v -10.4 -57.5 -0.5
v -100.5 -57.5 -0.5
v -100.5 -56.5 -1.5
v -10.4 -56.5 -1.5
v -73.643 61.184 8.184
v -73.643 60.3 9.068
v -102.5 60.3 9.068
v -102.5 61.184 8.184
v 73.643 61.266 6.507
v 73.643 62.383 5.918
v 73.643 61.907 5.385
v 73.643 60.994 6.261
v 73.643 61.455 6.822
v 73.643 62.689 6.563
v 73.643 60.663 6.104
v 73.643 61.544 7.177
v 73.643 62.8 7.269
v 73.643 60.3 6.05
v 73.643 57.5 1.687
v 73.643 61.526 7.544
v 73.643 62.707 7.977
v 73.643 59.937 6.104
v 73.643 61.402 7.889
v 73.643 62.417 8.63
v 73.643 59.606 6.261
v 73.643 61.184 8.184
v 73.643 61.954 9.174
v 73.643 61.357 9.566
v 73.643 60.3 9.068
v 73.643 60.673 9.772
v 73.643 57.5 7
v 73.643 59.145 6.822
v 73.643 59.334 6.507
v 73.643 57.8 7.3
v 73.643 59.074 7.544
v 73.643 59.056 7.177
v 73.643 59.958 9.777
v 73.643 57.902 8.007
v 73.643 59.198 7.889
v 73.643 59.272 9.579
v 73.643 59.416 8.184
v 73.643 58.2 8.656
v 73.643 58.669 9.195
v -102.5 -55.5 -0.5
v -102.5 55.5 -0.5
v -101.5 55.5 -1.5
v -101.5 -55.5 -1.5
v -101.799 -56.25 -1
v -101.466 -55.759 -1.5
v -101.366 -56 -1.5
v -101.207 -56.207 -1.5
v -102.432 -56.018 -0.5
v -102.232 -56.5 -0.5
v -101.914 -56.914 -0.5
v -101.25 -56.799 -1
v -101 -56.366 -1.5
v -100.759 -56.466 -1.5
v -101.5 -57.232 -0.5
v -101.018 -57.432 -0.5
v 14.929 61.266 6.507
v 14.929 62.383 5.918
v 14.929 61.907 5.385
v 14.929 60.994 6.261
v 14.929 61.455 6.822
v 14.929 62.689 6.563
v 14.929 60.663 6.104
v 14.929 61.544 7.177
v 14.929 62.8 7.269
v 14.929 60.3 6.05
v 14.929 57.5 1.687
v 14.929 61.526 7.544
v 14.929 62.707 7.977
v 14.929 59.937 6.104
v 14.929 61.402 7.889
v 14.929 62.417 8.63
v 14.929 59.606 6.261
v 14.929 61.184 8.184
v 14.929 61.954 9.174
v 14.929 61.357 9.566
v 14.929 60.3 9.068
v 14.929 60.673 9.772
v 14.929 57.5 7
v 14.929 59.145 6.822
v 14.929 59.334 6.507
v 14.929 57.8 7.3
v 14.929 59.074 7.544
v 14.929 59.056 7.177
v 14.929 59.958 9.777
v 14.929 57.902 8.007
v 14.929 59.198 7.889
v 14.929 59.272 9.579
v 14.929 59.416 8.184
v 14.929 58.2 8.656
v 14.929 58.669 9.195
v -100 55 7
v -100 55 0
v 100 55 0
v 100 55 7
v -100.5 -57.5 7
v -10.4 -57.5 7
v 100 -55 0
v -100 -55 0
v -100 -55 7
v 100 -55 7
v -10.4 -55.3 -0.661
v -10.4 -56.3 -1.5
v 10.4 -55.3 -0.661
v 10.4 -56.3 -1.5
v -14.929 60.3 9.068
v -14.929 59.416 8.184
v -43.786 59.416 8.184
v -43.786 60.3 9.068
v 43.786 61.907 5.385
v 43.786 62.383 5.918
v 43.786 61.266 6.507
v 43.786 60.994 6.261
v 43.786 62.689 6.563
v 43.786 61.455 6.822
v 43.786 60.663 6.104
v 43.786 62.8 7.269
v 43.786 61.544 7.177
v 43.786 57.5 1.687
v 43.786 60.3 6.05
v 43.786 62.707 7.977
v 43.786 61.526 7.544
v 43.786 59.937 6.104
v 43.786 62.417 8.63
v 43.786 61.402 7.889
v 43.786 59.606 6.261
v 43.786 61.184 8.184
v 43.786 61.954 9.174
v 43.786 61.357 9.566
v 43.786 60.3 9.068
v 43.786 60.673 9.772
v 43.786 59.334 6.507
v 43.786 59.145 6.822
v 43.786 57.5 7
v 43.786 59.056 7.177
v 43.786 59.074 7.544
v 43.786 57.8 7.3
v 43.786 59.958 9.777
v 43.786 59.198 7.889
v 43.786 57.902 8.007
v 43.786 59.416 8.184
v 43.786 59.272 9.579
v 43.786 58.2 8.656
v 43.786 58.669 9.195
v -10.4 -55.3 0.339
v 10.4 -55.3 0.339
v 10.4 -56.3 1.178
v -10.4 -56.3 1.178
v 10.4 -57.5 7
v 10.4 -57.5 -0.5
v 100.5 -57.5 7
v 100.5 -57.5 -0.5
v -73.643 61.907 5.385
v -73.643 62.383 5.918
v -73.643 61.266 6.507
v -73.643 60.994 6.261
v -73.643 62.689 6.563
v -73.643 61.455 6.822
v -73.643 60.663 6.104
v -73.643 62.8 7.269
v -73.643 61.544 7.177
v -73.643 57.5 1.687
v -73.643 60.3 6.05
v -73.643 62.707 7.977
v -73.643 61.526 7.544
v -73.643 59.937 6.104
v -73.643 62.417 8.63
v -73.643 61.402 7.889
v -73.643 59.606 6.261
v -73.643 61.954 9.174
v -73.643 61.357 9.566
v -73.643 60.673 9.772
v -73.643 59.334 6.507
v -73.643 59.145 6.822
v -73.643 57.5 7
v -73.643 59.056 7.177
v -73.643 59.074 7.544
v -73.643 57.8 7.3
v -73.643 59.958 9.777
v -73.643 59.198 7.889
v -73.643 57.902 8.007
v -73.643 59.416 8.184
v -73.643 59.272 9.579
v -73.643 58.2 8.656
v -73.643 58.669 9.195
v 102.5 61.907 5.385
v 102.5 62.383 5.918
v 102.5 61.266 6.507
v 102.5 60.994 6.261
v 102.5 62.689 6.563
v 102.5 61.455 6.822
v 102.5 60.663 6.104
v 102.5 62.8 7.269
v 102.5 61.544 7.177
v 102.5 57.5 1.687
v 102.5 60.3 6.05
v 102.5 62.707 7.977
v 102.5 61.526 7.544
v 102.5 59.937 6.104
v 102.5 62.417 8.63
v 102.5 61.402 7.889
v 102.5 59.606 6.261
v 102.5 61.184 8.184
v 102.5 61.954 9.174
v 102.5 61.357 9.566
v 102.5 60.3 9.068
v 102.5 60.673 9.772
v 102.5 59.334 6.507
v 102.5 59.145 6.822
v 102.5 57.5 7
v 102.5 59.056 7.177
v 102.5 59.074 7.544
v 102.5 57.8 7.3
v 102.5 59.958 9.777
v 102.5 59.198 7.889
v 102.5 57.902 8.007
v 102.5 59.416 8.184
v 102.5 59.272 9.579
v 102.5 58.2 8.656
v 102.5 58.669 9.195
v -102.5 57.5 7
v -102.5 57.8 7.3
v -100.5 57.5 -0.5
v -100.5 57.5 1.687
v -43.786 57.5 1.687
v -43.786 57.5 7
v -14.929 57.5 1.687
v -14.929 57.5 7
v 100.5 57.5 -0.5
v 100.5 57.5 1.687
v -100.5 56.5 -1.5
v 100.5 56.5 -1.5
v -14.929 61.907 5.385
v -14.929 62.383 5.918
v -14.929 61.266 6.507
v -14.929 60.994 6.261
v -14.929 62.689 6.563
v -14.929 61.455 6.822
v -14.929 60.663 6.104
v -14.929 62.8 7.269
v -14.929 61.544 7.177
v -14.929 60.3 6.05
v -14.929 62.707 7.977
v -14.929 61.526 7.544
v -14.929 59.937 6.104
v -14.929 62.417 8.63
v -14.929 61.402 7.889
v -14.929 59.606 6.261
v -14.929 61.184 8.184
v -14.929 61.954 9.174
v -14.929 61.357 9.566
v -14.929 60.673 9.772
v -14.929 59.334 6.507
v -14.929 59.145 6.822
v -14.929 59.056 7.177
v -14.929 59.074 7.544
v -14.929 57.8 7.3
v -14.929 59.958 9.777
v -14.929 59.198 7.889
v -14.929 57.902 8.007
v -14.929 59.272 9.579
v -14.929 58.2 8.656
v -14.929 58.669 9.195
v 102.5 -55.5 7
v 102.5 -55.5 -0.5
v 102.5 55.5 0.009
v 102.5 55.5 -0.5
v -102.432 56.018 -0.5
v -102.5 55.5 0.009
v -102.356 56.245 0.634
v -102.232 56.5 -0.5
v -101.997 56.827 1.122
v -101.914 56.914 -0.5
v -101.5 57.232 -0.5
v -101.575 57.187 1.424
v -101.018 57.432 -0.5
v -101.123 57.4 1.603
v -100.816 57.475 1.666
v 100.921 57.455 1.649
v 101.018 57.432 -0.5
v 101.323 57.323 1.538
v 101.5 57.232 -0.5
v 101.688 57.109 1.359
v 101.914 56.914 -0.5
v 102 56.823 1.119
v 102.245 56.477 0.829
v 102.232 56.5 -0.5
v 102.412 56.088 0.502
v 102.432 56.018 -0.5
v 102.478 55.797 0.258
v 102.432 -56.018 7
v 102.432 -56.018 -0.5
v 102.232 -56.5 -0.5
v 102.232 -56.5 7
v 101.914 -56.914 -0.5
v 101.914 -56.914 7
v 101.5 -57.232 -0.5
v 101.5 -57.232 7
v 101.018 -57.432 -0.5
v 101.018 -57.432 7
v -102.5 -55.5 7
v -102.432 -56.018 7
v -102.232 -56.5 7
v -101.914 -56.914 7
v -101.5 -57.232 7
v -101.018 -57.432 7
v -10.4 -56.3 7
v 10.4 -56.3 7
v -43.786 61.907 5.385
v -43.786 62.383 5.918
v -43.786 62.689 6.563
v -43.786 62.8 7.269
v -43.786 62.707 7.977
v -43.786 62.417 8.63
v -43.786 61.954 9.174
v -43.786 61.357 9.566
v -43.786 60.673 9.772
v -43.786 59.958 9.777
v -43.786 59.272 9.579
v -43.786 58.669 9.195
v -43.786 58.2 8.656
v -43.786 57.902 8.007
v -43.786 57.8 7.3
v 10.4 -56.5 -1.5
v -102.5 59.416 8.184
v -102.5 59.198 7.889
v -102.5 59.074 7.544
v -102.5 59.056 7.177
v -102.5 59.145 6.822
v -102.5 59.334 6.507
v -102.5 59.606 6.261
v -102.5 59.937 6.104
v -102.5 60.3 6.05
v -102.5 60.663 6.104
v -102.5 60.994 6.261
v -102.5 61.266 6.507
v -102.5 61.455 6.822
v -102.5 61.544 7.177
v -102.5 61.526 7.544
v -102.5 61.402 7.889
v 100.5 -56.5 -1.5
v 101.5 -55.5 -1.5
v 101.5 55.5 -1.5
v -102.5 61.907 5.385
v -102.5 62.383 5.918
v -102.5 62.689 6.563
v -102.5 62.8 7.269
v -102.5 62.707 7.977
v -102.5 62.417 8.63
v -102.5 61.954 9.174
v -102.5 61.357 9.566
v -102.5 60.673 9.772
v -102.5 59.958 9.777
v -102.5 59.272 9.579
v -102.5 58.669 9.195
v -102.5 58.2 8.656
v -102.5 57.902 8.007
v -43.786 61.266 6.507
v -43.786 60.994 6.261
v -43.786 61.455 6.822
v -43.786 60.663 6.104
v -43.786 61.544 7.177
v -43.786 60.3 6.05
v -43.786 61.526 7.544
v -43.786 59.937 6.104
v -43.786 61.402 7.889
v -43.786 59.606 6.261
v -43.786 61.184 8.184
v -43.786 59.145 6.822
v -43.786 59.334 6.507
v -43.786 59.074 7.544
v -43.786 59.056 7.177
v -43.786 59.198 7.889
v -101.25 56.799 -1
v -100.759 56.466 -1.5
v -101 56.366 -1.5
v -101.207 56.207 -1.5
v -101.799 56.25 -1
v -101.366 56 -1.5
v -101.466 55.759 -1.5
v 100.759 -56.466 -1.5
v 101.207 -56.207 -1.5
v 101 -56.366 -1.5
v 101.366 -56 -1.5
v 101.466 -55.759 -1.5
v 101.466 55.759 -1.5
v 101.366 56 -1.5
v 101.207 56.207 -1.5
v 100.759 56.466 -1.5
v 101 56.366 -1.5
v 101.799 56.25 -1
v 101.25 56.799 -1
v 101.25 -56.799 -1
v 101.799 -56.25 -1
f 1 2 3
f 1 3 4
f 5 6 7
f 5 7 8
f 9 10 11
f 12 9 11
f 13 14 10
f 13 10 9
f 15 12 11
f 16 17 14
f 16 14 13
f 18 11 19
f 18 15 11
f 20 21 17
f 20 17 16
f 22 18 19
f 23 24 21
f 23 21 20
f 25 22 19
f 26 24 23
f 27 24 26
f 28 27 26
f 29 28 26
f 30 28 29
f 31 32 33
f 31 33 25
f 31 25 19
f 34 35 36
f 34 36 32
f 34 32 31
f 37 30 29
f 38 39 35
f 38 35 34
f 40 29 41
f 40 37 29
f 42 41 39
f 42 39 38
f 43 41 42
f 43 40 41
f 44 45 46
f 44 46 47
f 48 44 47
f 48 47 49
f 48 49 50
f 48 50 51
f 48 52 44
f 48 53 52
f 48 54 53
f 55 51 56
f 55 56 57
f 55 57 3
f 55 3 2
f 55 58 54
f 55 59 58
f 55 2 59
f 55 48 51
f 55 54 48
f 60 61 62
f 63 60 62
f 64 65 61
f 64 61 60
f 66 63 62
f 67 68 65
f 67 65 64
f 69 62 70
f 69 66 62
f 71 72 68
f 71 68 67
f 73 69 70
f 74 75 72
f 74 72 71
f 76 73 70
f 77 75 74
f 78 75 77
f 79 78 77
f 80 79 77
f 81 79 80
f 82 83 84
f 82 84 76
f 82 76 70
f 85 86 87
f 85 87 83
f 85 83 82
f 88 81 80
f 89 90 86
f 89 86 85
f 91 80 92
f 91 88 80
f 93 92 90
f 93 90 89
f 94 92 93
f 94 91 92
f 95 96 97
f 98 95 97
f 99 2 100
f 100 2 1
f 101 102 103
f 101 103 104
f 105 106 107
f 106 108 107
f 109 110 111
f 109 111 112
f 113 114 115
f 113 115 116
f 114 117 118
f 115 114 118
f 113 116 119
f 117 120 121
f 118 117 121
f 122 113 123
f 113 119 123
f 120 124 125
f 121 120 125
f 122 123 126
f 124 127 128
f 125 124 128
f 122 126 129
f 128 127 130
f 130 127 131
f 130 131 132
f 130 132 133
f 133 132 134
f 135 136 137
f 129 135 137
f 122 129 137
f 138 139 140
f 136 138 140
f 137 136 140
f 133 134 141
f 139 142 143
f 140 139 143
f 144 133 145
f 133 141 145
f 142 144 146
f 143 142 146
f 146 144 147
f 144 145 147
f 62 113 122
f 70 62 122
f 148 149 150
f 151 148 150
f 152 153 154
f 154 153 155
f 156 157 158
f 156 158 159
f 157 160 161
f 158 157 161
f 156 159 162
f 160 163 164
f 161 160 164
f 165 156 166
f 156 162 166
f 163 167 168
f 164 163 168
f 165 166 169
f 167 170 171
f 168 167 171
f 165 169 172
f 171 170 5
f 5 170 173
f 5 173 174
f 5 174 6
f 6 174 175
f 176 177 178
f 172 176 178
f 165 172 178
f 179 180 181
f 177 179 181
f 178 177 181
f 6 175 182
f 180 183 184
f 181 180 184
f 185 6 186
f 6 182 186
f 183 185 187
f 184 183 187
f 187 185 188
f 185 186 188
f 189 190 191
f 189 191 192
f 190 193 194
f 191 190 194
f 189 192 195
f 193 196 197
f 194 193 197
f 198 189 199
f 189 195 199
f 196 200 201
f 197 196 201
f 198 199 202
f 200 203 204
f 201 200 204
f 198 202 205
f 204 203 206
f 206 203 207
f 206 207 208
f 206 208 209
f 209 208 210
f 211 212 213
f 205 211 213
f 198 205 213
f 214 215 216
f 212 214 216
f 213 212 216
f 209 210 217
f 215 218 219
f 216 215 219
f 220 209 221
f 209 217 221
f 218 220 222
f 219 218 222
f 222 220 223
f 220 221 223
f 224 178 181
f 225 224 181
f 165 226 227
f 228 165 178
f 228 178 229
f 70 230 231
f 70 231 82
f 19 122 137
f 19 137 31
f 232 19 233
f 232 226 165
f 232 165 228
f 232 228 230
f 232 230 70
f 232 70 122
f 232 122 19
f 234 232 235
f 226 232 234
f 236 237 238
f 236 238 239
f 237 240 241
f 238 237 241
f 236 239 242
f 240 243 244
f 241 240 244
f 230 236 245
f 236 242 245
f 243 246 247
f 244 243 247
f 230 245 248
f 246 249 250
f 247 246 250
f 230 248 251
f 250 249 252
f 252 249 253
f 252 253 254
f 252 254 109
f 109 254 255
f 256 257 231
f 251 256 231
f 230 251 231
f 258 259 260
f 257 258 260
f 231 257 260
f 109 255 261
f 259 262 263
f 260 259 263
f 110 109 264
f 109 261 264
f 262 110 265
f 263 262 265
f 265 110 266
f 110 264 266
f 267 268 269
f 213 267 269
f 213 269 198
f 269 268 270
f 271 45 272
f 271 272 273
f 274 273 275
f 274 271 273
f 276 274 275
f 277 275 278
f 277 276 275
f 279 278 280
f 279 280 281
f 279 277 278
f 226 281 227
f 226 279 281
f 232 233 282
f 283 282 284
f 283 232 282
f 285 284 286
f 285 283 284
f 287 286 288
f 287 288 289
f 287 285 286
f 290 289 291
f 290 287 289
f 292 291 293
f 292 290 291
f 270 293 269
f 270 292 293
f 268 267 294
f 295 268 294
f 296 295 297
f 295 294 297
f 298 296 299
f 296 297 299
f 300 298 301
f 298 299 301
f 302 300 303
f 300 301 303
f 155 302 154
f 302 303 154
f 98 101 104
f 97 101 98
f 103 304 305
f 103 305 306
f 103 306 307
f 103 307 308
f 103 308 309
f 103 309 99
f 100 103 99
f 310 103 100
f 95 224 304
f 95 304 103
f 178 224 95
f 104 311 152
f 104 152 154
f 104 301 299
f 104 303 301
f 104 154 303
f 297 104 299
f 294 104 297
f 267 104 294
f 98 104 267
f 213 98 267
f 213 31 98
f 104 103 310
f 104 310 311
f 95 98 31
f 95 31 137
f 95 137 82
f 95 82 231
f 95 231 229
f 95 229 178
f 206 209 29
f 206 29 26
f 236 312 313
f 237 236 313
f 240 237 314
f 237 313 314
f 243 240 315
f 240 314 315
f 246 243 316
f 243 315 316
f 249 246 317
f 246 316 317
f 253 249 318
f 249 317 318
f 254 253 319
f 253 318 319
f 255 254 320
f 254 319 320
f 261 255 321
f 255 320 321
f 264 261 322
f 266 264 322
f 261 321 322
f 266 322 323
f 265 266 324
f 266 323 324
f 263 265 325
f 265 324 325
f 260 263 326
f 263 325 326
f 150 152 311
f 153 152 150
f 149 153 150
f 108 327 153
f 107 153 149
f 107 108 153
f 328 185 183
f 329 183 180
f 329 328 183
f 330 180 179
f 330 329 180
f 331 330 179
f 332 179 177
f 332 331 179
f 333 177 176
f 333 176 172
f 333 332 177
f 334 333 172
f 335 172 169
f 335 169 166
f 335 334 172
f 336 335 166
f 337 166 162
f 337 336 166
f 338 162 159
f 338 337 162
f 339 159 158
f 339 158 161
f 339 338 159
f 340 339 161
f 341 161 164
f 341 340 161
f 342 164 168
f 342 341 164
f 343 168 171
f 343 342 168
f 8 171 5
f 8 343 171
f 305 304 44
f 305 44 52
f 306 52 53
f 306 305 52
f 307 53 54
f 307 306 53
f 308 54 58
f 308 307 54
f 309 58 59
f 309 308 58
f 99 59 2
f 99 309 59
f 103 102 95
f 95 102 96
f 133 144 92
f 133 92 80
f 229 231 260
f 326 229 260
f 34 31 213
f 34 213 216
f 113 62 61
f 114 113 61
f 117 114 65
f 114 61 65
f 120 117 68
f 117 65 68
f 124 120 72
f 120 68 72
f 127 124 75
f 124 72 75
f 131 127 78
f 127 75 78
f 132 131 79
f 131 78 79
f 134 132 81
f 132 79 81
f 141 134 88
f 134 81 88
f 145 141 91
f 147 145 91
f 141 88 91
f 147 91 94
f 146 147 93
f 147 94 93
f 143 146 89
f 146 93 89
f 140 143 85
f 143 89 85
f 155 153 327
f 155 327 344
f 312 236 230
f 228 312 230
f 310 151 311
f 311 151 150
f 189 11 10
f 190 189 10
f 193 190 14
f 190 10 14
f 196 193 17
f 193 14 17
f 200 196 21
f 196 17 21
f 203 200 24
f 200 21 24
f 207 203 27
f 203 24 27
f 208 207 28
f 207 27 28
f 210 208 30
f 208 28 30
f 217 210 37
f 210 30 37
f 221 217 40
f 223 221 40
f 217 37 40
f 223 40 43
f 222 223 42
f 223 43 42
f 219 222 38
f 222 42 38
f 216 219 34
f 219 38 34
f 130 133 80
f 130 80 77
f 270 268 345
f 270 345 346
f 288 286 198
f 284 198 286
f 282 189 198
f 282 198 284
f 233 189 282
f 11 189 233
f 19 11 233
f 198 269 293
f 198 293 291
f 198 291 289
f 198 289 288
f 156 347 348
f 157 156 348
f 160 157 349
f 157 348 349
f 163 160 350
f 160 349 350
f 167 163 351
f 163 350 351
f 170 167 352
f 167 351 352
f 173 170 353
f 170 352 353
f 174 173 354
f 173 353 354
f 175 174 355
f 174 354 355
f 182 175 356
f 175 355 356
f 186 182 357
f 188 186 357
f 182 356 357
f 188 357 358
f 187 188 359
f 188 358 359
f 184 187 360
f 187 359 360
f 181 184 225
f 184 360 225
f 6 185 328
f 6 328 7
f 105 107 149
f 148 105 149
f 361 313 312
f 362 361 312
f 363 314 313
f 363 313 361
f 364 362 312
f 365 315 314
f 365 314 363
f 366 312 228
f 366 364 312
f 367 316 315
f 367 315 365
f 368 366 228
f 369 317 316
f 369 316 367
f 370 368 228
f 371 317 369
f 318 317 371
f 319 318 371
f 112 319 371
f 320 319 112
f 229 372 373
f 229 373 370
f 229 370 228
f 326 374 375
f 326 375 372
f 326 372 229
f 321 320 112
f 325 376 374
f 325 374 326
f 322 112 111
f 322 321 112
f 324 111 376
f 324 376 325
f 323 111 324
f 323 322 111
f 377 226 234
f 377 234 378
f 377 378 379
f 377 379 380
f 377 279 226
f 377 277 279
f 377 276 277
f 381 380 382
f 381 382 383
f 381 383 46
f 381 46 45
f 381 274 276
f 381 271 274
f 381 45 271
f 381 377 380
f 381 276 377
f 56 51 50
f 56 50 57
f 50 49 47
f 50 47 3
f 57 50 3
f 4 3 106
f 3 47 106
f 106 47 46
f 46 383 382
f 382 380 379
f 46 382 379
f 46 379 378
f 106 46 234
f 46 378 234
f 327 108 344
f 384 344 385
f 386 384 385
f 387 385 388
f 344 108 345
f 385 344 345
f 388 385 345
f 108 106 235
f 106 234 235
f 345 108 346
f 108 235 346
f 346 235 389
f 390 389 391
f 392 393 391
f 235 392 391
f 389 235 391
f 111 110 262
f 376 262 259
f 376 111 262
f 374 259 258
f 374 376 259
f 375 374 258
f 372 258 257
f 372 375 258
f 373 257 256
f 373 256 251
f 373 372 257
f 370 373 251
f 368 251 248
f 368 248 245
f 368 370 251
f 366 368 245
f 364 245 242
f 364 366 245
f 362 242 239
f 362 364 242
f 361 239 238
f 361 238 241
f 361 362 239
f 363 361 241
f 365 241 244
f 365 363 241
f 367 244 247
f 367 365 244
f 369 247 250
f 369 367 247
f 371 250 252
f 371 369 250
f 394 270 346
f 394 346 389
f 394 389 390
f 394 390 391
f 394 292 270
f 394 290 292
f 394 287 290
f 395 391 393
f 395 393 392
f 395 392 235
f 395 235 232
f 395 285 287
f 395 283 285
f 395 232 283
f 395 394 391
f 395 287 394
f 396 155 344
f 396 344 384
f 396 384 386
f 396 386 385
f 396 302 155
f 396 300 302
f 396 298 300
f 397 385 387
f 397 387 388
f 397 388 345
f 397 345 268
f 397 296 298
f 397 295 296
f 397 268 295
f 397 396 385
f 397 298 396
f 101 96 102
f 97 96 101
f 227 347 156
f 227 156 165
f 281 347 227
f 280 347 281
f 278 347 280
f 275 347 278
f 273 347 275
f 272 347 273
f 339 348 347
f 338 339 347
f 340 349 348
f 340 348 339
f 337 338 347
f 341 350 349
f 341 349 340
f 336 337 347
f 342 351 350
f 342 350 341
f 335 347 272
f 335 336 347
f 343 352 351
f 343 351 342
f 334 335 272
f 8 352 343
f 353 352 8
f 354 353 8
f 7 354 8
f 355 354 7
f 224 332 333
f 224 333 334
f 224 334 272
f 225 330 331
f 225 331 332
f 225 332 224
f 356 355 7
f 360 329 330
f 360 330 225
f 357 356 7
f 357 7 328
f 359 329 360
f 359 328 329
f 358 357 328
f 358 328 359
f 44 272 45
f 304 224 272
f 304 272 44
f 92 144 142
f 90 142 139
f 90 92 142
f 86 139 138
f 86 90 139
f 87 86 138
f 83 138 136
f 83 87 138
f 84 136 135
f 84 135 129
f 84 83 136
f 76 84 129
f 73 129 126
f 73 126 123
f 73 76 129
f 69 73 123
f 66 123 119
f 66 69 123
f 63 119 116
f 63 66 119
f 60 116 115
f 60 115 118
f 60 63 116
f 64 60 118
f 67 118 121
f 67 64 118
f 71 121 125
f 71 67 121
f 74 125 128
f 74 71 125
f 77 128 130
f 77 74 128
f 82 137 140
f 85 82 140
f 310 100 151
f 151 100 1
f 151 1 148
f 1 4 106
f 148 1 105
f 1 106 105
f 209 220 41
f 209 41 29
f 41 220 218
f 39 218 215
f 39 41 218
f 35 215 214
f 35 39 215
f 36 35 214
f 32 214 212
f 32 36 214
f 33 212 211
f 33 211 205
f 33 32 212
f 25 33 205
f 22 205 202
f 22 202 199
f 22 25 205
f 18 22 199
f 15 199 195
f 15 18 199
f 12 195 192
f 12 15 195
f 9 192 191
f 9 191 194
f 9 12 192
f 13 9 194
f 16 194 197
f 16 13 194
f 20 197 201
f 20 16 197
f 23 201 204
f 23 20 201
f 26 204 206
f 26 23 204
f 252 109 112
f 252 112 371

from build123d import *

# Parameters (mm, degrees)
SKETCH_W            = 205
SKETCH_H            = 115
PAD_DEPTH           = 1.5
SKETCH001_W         = 205
SKETCH001_H         = 115
SKETCH001_W_2       = 200
SKETCH001_H_2       = 110
PAD001_DEPTH        = 7
SKETCH004_W         = 20.8
SKETCH004_H         = 1.2
POCKET_DEPTH        = 1.501
POCKET_DEPTH_BACK   = 7.001
POCKET001_DEPTH     = 10.4
PAD007_DEPTH        = 28.857143
LINEARPATTERN_COUNT = 4
LINEARPATTERN_PITCH = 58.714286
FILLET_R            = 2
CHAMFER_SIZE        = 1


with BuildPart() as part:
    # Sketch → Pad (new body)
    with BuildSketch(Plane.XY):
        Rectangle(SKETCH_W, SKETCH_H)
    extrude(amount=-PAD_DEPTH)

    # Sketch001 → Pad001 (join)
    with BuildSketch(Plane.XY):
        Rectangle(SKETCH001_W, SKETCH001_H)
        Rectangle(SKETCH001_W_2, SKETCH001_H_2, mode=Mode.SUBTRACT)
    extrude(amount=PAD001_DEPTH)

    # Sketch004 → Pocket (cut, two sides)
    with BuildSketch(Plane.XY) as pocket_sk:
        with Locations((0, -56.9)):
            Rectangle(SKETCH004_W, SKETCH004_H)
    extrude(amount=-POCKET_DEPTH, mode=Mode.SUBTRACT)
    extrude(pocket_sk.sketch, amount=POCKET_DEPTH_BACK, mode=Mode.SUBTRACT)

    # Sketch005 → Pocket001 (cut, symmetric)
    with BuildSketch(Plane.YZ):
        Polygon((-56.3, -1.5), (-55.3, -0.6609), (-55.3, 0.3391), (-56.3, 1.178199), align=None)
    extrude(amount=POCKET001_DEPTH, both=True, mode=Mode.SUBTRACT)

    # Sketch008 → Pad007 (join)
    with BuildSketch(Plane.YZ.offset(-102.5)):
        with BuildLine():
            Line((57.5, 7), (57.8, 7.3))
            ThreePointArc((61.906969, 5.384889), (61.356546, 9.565769), (57.8, 7.3))
            Line((61.906969, 5.384889), (57.5, 1.687003))
            Line((57.5, 7), (57.5, 1.687003))
        make_face()
        with BuildLine():
            Line((59.41611, 8.183877), (60.3, 9.067767))
            Line((60.3, 9.067767), (61.183875, 8.183892))
            ThreePointArc((59.41611, 8.183877), (60.30001, 6.05), (61.183875, 8.183892))
        make_face(mode=Mode.SUBTRACT)
    pad007 = extrude(amount=PAD007_DEPTH)

    # LinearPattern: Pad007 ×4
    with Locations(*[(i * LINEARPATTERN_PITCH, 0, 0) for i in range(1, LINEARPATTERN_COUNT)]):
        add(pad007)

    # Fillet
    fillet_edges = [part.edges().sort_by_distance(p)[0] for p in [
        (102.5, -57.5, 2.75),
        (102.5, 57.5, 0.093501),
        (-102.5, 57.5, 0.093501),
        (-102.5, -57.5, 2.75),
    ]]
    fillet(fillet_edges, radius=FILLET_R)

    # Chamfer
    chamfer_edges = [part.edges().sort_by_distance(p)[0] for p in [
        (55.45, -57.5, -1.5),
    ]]
    chamfer(chamfer_edges, length=CHAMFER_SIZE)


solid = part.part
